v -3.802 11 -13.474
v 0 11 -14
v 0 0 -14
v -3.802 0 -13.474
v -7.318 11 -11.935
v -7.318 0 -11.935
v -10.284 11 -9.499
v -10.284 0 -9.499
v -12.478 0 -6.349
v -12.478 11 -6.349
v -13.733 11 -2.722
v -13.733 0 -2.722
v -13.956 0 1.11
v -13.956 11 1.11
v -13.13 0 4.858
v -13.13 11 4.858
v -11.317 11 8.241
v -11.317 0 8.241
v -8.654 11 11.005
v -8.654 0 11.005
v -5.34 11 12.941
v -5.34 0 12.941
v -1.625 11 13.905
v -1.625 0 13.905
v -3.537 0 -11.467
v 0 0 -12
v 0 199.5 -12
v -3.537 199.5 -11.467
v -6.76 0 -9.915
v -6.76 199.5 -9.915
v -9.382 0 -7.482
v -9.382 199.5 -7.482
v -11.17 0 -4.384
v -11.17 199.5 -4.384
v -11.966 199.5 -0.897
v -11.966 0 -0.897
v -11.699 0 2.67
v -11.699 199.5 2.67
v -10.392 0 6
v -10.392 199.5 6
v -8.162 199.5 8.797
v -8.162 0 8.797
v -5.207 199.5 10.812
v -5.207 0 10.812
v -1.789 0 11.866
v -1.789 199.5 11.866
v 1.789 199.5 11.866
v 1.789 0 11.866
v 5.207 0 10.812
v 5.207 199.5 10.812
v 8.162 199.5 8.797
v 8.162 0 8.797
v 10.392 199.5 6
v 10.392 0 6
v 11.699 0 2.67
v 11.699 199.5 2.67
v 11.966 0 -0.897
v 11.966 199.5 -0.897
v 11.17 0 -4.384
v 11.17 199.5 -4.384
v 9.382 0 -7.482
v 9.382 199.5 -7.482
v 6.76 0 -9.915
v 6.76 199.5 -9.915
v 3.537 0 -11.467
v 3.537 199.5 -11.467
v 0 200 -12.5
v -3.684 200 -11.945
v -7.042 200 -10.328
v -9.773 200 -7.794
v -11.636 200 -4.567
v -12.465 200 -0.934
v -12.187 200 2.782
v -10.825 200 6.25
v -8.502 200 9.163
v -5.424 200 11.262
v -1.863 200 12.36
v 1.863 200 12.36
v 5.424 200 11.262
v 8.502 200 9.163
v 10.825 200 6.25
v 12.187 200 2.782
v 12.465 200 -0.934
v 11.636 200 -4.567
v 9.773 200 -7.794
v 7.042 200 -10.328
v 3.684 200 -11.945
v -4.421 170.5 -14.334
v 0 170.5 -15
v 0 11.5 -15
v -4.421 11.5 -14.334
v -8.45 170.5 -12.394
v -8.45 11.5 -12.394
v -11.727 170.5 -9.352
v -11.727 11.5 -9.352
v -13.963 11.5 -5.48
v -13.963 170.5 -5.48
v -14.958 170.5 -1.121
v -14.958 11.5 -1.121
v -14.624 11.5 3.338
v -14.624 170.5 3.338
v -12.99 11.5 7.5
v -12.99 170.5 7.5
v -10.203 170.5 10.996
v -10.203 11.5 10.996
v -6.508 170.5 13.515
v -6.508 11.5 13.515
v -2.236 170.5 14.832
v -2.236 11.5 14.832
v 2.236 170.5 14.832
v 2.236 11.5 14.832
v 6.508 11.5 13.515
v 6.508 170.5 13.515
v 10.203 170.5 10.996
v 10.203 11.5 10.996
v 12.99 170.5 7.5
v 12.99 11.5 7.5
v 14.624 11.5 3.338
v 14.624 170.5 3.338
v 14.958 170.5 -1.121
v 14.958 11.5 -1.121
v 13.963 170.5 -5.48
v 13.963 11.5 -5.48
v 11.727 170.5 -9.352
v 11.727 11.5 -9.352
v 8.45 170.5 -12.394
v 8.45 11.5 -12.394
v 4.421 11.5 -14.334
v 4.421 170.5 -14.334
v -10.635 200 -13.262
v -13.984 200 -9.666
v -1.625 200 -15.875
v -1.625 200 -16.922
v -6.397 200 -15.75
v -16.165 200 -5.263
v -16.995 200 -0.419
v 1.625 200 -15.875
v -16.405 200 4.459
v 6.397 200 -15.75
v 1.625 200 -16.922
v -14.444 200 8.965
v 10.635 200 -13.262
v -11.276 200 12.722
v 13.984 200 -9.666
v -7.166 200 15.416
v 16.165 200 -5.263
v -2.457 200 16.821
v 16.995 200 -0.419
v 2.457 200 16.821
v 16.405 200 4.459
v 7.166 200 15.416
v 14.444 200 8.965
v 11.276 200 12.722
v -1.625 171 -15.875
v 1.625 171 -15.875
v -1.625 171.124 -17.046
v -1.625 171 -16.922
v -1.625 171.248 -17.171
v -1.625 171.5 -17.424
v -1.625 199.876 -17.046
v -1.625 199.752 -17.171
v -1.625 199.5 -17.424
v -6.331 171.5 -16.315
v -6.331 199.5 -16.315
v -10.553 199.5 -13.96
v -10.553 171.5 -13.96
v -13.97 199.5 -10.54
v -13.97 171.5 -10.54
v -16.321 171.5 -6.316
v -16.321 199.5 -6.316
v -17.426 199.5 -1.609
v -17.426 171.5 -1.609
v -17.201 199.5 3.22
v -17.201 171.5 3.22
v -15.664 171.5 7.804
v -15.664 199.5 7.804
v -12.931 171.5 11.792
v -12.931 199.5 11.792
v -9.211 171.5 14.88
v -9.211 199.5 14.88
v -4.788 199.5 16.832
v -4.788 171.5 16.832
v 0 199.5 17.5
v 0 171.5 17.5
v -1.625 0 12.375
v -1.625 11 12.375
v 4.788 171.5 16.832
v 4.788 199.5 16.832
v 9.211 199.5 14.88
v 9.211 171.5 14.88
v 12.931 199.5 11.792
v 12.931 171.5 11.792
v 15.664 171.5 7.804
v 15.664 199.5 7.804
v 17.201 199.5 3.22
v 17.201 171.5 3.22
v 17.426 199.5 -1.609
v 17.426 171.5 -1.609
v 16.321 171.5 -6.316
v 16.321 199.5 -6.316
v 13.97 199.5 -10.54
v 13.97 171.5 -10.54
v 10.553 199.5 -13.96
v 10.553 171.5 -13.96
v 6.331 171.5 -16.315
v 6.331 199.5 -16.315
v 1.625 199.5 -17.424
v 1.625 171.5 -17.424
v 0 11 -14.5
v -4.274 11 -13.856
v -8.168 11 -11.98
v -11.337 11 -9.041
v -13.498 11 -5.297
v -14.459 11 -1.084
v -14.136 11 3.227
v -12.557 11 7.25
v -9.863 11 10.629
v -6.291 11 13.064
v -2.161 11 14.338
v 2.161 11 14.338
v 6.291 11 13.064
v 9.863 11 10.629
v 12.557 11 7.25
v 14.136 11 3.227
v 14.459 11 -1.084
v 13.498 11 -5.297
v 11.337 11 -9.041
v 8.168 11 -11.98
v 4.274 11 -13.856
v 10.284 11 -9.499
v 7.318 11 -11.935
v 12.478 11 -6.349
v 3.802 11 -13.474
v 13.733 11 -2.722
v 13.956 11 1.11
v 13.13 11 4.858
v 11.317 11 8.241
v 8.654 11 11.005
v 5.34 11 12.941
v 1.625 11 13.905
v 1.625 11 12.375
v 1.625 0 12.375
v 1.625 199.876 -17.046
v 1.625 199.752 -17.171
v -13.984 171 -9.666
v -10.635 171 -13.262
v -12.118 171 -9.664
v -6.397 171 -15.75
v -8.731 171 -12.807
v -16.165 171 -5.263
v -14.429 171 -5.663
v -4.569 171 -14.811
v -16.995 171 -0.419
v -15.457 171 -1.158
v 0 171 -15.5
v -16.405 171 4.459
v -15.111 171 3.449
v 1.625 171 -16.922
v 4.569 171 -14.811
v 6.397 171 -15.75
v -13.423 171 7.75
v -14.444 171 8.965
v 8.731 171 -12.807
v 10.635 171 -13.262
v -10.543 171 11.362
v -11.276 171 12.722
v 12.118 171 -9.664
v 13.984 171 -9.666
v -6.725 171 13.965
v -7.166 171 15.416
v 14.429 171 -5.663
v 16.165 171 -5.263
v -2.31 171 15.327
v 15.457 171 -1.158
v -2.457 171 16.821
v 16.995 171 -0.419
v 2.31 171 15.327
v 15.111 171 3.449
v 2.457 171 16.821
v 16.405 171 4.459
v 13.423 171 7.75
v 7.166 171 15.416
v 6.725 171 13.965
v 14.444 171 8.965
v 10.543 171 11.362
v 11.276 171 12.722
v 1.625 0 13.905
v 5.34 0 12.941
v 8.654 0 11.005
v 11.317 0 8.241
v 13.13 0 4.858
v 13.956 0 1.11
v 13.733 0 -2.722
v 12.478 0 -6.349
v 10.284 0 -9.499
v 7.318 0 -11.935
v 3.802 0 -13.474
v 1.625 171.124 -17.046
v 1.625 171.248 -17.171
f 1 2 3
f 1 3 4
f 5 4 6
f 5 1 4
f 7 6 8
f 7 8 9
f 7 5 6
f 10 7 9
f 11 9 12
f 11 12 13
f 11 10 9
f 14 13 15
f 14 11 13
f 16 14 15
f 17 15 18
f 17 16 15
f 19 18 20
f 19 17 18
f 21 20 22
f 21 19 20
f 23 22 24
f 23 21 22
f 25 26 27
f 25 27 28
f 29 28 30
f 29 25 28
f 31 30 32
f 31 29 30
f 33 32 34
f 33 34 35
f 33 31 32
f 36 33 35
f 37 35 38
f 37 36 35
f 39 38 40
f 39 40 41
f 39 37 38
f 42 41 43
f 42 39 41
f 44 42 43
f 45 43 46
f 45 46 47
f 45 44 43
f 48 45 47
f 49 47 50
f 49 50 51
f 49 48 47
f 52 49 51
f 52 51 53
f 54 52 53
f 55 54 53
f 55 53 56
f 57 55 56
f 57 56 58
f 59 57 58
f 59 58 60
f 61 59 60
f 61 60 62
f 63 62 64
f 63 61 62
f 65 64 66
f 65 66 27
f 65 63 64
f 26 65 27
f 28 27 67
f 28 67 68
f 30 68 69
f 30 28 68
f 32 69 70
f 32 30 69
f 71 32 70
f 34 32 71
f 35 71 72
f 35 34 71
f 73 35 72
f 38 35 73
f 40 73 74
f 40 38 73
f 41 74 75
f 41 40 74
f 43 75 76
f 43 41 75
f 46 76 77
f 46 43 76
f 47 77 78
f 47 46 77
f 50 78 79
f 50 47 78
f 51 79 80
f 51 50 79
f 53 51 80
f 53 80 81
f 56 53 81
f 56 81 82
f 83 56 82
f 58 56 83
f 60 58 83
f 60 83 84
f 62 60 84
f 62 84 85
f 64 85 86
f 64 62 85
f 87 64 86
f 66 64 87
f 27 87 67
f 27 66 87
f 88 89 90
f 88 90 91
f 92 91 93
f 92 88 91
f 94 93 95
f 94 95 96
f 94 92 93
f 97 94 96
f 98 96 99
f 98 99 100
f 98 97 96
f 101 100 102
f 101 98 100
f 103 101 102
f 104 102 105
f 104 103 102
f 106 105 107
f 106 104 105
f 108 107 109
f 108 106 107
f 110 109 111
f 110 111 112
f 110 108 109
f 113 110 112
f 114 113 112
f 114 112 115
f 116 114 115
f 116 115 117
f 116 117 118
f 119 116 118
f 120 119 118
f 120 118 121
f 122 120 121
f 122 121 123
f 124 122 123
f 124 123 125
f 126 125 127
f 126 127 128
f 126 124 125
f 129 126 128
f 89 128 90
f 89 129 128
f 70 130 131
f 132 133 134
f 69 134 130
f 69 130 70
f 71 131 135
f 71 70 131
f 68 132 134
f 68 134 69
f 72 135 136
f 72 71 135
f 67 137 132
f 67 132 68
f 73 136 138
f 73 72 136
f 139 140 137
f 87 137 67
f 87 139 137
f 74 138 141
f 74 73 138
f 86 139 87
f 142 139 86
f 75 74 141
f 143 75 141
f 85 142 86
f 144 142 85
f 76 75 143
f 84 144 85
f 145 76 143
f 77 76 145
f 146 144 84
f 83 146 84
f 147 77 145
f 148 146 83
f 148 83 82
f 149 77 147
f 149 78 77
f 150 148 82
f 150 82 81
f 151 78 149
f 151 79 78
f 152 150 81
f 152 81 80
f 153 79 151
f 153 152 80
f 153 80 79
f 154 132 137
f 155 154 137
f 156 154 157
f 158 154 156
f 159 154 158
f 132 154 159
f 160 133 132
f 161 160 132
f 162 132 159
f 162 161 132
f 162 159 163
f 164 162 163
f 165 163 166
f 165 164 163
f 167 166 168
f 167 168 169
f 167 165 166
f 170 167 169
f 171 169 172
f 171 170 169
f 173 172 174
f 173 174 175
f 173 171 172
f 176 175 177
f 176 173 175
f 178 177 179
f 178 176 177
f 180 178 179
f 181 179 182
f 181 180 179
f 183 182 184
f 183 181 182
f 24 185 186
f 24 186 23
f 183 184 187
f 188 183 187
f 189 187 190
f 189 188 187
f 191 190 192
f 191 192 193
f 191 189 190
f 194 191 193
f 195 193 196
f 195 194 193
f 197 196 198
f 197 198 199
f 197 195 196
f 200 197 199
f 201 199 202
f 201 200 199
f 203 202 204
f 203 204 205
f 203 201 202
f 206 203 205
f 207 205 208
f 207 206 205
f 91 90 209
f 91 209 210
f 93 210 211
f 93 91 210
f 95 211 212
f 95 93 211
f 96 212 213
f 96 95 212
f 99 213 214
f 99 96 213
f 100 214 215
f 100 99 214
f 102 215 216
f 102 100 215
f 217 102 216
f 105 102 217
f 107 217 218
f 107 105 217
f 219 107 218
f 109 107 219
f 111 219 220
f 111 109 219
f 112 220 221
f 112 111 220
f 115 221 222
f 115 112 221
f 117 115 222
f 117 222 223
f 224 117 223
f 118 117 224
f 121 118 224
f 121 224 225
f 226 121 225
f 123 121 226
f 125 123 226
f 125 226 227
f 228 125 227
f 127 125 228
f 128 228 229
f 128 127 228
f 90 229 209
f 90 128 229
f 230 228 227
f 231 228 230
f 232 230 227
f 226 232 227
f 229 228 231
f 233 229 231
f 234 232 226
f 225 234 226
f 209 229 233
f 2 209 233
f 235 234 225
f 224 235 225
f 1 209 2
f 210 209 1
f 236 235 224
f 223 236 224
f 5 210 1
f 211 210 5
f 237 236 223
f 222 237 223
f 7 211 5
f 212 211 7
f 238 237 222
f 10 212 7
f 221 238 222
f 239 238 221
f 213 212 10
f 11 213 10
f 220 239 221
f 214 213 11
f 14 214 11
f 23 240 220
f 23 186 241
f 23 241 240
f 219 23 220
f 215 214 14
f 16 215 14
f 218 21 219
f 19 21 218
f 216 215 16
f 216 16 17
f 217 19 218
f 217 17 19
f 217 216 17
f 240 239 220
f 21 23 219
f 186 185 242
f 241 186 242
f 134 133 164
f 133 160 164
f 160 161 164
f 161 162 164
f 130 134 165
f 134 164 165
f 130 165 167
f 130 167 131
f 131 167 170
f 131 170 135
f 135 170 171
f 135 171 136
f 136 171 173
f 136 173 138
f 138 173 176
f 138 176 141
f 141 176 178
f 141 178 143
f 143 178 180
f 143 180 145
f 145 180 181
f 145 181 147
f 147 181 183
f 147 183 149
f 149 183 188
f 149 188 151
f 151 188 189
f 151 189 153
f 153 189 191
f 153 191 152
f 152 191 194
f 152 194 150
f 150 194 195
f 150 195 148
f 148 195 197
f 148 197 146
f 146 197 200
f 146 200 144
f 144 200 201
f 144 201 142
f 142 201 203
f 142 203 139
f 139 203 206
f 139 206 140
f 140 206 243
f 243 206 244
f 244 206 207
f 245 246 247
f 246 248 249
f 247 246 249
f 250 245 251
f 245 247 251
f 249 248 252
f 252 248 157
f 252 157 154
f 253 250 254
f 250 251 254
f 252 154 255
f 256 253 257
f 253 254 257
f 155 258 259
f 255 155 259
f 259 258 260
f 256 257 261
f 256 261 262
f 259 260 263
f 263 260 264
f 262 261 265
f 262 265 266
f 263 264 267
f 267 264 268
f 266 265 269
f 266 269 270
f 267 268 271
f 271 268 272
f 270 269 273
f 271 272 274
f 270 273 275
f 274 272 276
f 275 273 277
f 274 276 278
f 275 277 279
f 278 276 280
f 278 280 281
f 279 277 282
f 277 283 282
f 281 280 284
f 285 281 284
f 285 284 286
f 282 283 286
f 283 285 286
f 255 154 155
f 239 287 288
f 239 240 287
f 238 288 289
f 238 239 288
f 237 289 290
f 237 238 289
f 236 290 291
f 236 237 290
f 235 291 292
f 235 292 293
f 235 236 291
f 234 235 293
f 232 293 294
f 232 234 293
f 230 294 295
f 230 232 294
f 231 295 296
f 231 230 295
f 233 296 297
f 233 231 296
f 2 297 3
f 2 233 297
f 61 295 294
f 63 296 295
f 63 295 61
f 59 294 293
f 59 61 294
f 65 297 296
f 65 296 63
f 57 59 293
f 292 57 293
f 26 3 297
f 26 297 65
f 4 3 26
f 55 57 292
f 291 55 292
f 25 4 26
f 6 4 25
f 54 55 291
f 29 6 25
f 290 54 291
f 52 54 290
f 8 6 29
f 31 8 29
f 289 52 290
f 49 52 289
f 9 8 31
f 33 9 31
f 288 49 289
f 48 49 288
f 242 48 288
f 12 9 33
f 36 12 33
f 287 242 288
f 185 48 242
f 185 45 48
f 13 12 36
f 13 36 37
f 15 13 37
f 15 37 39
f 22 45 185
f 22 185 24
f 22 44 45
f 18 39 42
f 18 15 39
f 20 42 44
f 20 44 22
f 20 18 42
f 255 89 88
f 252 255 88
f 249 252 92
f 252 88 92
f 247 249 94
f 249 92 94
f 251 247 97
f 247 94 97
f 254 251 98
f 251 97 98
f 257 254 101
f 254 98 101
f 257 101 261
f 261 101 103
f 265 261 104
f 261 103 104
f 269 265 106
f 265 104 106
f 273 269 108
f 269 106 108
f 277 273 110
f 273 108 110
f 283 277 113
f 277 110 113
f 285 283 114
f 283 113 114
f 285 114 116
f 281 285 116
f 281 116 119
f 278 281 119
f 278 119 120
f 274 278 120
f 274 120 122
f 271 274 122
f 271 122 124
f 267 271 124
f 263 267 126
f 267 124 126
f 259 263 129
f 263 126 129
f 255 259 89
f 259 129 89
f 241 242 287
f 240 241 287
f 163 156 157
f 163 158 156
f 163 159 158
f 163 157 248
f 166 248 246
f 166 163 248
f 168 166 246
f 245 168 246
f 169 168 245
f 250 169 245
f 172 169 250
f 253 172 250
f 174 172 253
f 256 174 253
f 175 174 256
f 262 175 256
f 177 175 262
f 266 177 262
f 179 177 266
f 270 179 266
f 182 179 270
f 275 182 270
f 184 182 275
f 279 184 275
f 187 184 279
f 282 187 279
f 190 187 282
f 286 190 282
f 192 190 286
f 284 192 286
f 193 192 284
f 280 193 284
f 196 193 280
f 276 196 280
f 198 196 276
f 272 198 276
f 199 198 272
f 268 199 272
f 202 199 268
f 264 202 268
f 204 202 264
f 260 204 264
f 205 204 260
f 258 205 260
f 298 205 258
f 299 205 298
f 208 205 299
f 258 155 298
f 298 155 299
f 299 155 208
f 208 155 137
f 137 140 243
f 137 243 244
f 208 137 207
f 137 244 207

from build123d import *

# Parameters (mm, degrees)
SKETCH2_W           = 3.25
SKETCH2_H           = 3.25
CUT_EXTRUDE1_DEPTH  = 11
CHAMFER1_SIZE       = 0.5
SKETCH3_R           = 17.5
SKETCH3_R_2         = 15
BOSS_EXTRUDE1_DEPTH = 29
SKETCH4_W           = 3.25
SKETCH4_H           = 3.25
CUT_EXTRUDE2_DEPTH  = 29
CHAMFER2_SIZE       = 0.5


with BuildPart() as part:
    # Sketch1 → Revolve1 (revolve)
    with BuildSketch(Plane.XY, mode=Mode.PRIVATE) as revolve1_sk:
        Polygon((12, 200), (12, 0), (14, 0), (14, 11), (15, 11), (15, 200), align=None)
    revolve(revolve1_sk.sketch.rotate(Axis((0, 0, 0), (0, 1, 0)), 90), axis=Axis((0, 0, 0), (0, 1, 0)))

    # Sketch2 → Cut-Extrude1 (cut)
    with BuildSketch(Plane.XZ):
        with Locations((0, 14)):
            Rectangle(SKETCH2_W, SKETCH2_H)
    extrude(amount=-CUT_EXTRUDE1_DEPTH, mode=Mode.SUBTRACT)

    # Chamfer1
    chamfer1_edges = [part.edges().sort_by_distance(p)[0] for p in [
        (0, 11, 15),
    ]]
    chamfer(chamfer1_edges, length=CHAMFER1_SIZE)

    # Sketch3 → Boss-Extrude1 (add)
    with BuildSketch(Plane(origin=(0, 200, 0), x_dir=(1, 0, 0), z_dir=(0, 1, 0))):
        with Locations(Location((0, 0, 0), (0, 0, 270))):
            Circle(SKETCH3_R)
        with Locations(Location((0, 0, 0), (0, 0, 90))):
            Circle(SKETCH3_R_2, mode=Mode.SUBTRACT)
    extrude(amount=-BOSS_EXTRUDE1_DEPTH)

    # Sketch4 → Cut-Extrude2 (cut)
    with BuildSketch(Plane(origin=(0, 200, 0), x_dir=(1, 0, 0), z_dir=(0, 1, 0))):
        with Locations((0, 17.5)):
            Rectangle(SKETCH4_W, SKETCH4_H)
    extrude(amount=-CUT_EXTRUDE2_DEPTH, mode=Mode.SUBTRACT)

    # Chamfer2
    chamfer2_edges = [part.edges().sort_by_distance(p)[0] for p in [
        (0, 171, 15),
        (-17.481087339, 171, 0.813379038),
        (-17.481087339, 200, 0.813379038),
        (0, 200, 12),
    ]]
    chamfer(chamfer2_edges, length=CHAMFER2_SIZE)


solid = part.part
